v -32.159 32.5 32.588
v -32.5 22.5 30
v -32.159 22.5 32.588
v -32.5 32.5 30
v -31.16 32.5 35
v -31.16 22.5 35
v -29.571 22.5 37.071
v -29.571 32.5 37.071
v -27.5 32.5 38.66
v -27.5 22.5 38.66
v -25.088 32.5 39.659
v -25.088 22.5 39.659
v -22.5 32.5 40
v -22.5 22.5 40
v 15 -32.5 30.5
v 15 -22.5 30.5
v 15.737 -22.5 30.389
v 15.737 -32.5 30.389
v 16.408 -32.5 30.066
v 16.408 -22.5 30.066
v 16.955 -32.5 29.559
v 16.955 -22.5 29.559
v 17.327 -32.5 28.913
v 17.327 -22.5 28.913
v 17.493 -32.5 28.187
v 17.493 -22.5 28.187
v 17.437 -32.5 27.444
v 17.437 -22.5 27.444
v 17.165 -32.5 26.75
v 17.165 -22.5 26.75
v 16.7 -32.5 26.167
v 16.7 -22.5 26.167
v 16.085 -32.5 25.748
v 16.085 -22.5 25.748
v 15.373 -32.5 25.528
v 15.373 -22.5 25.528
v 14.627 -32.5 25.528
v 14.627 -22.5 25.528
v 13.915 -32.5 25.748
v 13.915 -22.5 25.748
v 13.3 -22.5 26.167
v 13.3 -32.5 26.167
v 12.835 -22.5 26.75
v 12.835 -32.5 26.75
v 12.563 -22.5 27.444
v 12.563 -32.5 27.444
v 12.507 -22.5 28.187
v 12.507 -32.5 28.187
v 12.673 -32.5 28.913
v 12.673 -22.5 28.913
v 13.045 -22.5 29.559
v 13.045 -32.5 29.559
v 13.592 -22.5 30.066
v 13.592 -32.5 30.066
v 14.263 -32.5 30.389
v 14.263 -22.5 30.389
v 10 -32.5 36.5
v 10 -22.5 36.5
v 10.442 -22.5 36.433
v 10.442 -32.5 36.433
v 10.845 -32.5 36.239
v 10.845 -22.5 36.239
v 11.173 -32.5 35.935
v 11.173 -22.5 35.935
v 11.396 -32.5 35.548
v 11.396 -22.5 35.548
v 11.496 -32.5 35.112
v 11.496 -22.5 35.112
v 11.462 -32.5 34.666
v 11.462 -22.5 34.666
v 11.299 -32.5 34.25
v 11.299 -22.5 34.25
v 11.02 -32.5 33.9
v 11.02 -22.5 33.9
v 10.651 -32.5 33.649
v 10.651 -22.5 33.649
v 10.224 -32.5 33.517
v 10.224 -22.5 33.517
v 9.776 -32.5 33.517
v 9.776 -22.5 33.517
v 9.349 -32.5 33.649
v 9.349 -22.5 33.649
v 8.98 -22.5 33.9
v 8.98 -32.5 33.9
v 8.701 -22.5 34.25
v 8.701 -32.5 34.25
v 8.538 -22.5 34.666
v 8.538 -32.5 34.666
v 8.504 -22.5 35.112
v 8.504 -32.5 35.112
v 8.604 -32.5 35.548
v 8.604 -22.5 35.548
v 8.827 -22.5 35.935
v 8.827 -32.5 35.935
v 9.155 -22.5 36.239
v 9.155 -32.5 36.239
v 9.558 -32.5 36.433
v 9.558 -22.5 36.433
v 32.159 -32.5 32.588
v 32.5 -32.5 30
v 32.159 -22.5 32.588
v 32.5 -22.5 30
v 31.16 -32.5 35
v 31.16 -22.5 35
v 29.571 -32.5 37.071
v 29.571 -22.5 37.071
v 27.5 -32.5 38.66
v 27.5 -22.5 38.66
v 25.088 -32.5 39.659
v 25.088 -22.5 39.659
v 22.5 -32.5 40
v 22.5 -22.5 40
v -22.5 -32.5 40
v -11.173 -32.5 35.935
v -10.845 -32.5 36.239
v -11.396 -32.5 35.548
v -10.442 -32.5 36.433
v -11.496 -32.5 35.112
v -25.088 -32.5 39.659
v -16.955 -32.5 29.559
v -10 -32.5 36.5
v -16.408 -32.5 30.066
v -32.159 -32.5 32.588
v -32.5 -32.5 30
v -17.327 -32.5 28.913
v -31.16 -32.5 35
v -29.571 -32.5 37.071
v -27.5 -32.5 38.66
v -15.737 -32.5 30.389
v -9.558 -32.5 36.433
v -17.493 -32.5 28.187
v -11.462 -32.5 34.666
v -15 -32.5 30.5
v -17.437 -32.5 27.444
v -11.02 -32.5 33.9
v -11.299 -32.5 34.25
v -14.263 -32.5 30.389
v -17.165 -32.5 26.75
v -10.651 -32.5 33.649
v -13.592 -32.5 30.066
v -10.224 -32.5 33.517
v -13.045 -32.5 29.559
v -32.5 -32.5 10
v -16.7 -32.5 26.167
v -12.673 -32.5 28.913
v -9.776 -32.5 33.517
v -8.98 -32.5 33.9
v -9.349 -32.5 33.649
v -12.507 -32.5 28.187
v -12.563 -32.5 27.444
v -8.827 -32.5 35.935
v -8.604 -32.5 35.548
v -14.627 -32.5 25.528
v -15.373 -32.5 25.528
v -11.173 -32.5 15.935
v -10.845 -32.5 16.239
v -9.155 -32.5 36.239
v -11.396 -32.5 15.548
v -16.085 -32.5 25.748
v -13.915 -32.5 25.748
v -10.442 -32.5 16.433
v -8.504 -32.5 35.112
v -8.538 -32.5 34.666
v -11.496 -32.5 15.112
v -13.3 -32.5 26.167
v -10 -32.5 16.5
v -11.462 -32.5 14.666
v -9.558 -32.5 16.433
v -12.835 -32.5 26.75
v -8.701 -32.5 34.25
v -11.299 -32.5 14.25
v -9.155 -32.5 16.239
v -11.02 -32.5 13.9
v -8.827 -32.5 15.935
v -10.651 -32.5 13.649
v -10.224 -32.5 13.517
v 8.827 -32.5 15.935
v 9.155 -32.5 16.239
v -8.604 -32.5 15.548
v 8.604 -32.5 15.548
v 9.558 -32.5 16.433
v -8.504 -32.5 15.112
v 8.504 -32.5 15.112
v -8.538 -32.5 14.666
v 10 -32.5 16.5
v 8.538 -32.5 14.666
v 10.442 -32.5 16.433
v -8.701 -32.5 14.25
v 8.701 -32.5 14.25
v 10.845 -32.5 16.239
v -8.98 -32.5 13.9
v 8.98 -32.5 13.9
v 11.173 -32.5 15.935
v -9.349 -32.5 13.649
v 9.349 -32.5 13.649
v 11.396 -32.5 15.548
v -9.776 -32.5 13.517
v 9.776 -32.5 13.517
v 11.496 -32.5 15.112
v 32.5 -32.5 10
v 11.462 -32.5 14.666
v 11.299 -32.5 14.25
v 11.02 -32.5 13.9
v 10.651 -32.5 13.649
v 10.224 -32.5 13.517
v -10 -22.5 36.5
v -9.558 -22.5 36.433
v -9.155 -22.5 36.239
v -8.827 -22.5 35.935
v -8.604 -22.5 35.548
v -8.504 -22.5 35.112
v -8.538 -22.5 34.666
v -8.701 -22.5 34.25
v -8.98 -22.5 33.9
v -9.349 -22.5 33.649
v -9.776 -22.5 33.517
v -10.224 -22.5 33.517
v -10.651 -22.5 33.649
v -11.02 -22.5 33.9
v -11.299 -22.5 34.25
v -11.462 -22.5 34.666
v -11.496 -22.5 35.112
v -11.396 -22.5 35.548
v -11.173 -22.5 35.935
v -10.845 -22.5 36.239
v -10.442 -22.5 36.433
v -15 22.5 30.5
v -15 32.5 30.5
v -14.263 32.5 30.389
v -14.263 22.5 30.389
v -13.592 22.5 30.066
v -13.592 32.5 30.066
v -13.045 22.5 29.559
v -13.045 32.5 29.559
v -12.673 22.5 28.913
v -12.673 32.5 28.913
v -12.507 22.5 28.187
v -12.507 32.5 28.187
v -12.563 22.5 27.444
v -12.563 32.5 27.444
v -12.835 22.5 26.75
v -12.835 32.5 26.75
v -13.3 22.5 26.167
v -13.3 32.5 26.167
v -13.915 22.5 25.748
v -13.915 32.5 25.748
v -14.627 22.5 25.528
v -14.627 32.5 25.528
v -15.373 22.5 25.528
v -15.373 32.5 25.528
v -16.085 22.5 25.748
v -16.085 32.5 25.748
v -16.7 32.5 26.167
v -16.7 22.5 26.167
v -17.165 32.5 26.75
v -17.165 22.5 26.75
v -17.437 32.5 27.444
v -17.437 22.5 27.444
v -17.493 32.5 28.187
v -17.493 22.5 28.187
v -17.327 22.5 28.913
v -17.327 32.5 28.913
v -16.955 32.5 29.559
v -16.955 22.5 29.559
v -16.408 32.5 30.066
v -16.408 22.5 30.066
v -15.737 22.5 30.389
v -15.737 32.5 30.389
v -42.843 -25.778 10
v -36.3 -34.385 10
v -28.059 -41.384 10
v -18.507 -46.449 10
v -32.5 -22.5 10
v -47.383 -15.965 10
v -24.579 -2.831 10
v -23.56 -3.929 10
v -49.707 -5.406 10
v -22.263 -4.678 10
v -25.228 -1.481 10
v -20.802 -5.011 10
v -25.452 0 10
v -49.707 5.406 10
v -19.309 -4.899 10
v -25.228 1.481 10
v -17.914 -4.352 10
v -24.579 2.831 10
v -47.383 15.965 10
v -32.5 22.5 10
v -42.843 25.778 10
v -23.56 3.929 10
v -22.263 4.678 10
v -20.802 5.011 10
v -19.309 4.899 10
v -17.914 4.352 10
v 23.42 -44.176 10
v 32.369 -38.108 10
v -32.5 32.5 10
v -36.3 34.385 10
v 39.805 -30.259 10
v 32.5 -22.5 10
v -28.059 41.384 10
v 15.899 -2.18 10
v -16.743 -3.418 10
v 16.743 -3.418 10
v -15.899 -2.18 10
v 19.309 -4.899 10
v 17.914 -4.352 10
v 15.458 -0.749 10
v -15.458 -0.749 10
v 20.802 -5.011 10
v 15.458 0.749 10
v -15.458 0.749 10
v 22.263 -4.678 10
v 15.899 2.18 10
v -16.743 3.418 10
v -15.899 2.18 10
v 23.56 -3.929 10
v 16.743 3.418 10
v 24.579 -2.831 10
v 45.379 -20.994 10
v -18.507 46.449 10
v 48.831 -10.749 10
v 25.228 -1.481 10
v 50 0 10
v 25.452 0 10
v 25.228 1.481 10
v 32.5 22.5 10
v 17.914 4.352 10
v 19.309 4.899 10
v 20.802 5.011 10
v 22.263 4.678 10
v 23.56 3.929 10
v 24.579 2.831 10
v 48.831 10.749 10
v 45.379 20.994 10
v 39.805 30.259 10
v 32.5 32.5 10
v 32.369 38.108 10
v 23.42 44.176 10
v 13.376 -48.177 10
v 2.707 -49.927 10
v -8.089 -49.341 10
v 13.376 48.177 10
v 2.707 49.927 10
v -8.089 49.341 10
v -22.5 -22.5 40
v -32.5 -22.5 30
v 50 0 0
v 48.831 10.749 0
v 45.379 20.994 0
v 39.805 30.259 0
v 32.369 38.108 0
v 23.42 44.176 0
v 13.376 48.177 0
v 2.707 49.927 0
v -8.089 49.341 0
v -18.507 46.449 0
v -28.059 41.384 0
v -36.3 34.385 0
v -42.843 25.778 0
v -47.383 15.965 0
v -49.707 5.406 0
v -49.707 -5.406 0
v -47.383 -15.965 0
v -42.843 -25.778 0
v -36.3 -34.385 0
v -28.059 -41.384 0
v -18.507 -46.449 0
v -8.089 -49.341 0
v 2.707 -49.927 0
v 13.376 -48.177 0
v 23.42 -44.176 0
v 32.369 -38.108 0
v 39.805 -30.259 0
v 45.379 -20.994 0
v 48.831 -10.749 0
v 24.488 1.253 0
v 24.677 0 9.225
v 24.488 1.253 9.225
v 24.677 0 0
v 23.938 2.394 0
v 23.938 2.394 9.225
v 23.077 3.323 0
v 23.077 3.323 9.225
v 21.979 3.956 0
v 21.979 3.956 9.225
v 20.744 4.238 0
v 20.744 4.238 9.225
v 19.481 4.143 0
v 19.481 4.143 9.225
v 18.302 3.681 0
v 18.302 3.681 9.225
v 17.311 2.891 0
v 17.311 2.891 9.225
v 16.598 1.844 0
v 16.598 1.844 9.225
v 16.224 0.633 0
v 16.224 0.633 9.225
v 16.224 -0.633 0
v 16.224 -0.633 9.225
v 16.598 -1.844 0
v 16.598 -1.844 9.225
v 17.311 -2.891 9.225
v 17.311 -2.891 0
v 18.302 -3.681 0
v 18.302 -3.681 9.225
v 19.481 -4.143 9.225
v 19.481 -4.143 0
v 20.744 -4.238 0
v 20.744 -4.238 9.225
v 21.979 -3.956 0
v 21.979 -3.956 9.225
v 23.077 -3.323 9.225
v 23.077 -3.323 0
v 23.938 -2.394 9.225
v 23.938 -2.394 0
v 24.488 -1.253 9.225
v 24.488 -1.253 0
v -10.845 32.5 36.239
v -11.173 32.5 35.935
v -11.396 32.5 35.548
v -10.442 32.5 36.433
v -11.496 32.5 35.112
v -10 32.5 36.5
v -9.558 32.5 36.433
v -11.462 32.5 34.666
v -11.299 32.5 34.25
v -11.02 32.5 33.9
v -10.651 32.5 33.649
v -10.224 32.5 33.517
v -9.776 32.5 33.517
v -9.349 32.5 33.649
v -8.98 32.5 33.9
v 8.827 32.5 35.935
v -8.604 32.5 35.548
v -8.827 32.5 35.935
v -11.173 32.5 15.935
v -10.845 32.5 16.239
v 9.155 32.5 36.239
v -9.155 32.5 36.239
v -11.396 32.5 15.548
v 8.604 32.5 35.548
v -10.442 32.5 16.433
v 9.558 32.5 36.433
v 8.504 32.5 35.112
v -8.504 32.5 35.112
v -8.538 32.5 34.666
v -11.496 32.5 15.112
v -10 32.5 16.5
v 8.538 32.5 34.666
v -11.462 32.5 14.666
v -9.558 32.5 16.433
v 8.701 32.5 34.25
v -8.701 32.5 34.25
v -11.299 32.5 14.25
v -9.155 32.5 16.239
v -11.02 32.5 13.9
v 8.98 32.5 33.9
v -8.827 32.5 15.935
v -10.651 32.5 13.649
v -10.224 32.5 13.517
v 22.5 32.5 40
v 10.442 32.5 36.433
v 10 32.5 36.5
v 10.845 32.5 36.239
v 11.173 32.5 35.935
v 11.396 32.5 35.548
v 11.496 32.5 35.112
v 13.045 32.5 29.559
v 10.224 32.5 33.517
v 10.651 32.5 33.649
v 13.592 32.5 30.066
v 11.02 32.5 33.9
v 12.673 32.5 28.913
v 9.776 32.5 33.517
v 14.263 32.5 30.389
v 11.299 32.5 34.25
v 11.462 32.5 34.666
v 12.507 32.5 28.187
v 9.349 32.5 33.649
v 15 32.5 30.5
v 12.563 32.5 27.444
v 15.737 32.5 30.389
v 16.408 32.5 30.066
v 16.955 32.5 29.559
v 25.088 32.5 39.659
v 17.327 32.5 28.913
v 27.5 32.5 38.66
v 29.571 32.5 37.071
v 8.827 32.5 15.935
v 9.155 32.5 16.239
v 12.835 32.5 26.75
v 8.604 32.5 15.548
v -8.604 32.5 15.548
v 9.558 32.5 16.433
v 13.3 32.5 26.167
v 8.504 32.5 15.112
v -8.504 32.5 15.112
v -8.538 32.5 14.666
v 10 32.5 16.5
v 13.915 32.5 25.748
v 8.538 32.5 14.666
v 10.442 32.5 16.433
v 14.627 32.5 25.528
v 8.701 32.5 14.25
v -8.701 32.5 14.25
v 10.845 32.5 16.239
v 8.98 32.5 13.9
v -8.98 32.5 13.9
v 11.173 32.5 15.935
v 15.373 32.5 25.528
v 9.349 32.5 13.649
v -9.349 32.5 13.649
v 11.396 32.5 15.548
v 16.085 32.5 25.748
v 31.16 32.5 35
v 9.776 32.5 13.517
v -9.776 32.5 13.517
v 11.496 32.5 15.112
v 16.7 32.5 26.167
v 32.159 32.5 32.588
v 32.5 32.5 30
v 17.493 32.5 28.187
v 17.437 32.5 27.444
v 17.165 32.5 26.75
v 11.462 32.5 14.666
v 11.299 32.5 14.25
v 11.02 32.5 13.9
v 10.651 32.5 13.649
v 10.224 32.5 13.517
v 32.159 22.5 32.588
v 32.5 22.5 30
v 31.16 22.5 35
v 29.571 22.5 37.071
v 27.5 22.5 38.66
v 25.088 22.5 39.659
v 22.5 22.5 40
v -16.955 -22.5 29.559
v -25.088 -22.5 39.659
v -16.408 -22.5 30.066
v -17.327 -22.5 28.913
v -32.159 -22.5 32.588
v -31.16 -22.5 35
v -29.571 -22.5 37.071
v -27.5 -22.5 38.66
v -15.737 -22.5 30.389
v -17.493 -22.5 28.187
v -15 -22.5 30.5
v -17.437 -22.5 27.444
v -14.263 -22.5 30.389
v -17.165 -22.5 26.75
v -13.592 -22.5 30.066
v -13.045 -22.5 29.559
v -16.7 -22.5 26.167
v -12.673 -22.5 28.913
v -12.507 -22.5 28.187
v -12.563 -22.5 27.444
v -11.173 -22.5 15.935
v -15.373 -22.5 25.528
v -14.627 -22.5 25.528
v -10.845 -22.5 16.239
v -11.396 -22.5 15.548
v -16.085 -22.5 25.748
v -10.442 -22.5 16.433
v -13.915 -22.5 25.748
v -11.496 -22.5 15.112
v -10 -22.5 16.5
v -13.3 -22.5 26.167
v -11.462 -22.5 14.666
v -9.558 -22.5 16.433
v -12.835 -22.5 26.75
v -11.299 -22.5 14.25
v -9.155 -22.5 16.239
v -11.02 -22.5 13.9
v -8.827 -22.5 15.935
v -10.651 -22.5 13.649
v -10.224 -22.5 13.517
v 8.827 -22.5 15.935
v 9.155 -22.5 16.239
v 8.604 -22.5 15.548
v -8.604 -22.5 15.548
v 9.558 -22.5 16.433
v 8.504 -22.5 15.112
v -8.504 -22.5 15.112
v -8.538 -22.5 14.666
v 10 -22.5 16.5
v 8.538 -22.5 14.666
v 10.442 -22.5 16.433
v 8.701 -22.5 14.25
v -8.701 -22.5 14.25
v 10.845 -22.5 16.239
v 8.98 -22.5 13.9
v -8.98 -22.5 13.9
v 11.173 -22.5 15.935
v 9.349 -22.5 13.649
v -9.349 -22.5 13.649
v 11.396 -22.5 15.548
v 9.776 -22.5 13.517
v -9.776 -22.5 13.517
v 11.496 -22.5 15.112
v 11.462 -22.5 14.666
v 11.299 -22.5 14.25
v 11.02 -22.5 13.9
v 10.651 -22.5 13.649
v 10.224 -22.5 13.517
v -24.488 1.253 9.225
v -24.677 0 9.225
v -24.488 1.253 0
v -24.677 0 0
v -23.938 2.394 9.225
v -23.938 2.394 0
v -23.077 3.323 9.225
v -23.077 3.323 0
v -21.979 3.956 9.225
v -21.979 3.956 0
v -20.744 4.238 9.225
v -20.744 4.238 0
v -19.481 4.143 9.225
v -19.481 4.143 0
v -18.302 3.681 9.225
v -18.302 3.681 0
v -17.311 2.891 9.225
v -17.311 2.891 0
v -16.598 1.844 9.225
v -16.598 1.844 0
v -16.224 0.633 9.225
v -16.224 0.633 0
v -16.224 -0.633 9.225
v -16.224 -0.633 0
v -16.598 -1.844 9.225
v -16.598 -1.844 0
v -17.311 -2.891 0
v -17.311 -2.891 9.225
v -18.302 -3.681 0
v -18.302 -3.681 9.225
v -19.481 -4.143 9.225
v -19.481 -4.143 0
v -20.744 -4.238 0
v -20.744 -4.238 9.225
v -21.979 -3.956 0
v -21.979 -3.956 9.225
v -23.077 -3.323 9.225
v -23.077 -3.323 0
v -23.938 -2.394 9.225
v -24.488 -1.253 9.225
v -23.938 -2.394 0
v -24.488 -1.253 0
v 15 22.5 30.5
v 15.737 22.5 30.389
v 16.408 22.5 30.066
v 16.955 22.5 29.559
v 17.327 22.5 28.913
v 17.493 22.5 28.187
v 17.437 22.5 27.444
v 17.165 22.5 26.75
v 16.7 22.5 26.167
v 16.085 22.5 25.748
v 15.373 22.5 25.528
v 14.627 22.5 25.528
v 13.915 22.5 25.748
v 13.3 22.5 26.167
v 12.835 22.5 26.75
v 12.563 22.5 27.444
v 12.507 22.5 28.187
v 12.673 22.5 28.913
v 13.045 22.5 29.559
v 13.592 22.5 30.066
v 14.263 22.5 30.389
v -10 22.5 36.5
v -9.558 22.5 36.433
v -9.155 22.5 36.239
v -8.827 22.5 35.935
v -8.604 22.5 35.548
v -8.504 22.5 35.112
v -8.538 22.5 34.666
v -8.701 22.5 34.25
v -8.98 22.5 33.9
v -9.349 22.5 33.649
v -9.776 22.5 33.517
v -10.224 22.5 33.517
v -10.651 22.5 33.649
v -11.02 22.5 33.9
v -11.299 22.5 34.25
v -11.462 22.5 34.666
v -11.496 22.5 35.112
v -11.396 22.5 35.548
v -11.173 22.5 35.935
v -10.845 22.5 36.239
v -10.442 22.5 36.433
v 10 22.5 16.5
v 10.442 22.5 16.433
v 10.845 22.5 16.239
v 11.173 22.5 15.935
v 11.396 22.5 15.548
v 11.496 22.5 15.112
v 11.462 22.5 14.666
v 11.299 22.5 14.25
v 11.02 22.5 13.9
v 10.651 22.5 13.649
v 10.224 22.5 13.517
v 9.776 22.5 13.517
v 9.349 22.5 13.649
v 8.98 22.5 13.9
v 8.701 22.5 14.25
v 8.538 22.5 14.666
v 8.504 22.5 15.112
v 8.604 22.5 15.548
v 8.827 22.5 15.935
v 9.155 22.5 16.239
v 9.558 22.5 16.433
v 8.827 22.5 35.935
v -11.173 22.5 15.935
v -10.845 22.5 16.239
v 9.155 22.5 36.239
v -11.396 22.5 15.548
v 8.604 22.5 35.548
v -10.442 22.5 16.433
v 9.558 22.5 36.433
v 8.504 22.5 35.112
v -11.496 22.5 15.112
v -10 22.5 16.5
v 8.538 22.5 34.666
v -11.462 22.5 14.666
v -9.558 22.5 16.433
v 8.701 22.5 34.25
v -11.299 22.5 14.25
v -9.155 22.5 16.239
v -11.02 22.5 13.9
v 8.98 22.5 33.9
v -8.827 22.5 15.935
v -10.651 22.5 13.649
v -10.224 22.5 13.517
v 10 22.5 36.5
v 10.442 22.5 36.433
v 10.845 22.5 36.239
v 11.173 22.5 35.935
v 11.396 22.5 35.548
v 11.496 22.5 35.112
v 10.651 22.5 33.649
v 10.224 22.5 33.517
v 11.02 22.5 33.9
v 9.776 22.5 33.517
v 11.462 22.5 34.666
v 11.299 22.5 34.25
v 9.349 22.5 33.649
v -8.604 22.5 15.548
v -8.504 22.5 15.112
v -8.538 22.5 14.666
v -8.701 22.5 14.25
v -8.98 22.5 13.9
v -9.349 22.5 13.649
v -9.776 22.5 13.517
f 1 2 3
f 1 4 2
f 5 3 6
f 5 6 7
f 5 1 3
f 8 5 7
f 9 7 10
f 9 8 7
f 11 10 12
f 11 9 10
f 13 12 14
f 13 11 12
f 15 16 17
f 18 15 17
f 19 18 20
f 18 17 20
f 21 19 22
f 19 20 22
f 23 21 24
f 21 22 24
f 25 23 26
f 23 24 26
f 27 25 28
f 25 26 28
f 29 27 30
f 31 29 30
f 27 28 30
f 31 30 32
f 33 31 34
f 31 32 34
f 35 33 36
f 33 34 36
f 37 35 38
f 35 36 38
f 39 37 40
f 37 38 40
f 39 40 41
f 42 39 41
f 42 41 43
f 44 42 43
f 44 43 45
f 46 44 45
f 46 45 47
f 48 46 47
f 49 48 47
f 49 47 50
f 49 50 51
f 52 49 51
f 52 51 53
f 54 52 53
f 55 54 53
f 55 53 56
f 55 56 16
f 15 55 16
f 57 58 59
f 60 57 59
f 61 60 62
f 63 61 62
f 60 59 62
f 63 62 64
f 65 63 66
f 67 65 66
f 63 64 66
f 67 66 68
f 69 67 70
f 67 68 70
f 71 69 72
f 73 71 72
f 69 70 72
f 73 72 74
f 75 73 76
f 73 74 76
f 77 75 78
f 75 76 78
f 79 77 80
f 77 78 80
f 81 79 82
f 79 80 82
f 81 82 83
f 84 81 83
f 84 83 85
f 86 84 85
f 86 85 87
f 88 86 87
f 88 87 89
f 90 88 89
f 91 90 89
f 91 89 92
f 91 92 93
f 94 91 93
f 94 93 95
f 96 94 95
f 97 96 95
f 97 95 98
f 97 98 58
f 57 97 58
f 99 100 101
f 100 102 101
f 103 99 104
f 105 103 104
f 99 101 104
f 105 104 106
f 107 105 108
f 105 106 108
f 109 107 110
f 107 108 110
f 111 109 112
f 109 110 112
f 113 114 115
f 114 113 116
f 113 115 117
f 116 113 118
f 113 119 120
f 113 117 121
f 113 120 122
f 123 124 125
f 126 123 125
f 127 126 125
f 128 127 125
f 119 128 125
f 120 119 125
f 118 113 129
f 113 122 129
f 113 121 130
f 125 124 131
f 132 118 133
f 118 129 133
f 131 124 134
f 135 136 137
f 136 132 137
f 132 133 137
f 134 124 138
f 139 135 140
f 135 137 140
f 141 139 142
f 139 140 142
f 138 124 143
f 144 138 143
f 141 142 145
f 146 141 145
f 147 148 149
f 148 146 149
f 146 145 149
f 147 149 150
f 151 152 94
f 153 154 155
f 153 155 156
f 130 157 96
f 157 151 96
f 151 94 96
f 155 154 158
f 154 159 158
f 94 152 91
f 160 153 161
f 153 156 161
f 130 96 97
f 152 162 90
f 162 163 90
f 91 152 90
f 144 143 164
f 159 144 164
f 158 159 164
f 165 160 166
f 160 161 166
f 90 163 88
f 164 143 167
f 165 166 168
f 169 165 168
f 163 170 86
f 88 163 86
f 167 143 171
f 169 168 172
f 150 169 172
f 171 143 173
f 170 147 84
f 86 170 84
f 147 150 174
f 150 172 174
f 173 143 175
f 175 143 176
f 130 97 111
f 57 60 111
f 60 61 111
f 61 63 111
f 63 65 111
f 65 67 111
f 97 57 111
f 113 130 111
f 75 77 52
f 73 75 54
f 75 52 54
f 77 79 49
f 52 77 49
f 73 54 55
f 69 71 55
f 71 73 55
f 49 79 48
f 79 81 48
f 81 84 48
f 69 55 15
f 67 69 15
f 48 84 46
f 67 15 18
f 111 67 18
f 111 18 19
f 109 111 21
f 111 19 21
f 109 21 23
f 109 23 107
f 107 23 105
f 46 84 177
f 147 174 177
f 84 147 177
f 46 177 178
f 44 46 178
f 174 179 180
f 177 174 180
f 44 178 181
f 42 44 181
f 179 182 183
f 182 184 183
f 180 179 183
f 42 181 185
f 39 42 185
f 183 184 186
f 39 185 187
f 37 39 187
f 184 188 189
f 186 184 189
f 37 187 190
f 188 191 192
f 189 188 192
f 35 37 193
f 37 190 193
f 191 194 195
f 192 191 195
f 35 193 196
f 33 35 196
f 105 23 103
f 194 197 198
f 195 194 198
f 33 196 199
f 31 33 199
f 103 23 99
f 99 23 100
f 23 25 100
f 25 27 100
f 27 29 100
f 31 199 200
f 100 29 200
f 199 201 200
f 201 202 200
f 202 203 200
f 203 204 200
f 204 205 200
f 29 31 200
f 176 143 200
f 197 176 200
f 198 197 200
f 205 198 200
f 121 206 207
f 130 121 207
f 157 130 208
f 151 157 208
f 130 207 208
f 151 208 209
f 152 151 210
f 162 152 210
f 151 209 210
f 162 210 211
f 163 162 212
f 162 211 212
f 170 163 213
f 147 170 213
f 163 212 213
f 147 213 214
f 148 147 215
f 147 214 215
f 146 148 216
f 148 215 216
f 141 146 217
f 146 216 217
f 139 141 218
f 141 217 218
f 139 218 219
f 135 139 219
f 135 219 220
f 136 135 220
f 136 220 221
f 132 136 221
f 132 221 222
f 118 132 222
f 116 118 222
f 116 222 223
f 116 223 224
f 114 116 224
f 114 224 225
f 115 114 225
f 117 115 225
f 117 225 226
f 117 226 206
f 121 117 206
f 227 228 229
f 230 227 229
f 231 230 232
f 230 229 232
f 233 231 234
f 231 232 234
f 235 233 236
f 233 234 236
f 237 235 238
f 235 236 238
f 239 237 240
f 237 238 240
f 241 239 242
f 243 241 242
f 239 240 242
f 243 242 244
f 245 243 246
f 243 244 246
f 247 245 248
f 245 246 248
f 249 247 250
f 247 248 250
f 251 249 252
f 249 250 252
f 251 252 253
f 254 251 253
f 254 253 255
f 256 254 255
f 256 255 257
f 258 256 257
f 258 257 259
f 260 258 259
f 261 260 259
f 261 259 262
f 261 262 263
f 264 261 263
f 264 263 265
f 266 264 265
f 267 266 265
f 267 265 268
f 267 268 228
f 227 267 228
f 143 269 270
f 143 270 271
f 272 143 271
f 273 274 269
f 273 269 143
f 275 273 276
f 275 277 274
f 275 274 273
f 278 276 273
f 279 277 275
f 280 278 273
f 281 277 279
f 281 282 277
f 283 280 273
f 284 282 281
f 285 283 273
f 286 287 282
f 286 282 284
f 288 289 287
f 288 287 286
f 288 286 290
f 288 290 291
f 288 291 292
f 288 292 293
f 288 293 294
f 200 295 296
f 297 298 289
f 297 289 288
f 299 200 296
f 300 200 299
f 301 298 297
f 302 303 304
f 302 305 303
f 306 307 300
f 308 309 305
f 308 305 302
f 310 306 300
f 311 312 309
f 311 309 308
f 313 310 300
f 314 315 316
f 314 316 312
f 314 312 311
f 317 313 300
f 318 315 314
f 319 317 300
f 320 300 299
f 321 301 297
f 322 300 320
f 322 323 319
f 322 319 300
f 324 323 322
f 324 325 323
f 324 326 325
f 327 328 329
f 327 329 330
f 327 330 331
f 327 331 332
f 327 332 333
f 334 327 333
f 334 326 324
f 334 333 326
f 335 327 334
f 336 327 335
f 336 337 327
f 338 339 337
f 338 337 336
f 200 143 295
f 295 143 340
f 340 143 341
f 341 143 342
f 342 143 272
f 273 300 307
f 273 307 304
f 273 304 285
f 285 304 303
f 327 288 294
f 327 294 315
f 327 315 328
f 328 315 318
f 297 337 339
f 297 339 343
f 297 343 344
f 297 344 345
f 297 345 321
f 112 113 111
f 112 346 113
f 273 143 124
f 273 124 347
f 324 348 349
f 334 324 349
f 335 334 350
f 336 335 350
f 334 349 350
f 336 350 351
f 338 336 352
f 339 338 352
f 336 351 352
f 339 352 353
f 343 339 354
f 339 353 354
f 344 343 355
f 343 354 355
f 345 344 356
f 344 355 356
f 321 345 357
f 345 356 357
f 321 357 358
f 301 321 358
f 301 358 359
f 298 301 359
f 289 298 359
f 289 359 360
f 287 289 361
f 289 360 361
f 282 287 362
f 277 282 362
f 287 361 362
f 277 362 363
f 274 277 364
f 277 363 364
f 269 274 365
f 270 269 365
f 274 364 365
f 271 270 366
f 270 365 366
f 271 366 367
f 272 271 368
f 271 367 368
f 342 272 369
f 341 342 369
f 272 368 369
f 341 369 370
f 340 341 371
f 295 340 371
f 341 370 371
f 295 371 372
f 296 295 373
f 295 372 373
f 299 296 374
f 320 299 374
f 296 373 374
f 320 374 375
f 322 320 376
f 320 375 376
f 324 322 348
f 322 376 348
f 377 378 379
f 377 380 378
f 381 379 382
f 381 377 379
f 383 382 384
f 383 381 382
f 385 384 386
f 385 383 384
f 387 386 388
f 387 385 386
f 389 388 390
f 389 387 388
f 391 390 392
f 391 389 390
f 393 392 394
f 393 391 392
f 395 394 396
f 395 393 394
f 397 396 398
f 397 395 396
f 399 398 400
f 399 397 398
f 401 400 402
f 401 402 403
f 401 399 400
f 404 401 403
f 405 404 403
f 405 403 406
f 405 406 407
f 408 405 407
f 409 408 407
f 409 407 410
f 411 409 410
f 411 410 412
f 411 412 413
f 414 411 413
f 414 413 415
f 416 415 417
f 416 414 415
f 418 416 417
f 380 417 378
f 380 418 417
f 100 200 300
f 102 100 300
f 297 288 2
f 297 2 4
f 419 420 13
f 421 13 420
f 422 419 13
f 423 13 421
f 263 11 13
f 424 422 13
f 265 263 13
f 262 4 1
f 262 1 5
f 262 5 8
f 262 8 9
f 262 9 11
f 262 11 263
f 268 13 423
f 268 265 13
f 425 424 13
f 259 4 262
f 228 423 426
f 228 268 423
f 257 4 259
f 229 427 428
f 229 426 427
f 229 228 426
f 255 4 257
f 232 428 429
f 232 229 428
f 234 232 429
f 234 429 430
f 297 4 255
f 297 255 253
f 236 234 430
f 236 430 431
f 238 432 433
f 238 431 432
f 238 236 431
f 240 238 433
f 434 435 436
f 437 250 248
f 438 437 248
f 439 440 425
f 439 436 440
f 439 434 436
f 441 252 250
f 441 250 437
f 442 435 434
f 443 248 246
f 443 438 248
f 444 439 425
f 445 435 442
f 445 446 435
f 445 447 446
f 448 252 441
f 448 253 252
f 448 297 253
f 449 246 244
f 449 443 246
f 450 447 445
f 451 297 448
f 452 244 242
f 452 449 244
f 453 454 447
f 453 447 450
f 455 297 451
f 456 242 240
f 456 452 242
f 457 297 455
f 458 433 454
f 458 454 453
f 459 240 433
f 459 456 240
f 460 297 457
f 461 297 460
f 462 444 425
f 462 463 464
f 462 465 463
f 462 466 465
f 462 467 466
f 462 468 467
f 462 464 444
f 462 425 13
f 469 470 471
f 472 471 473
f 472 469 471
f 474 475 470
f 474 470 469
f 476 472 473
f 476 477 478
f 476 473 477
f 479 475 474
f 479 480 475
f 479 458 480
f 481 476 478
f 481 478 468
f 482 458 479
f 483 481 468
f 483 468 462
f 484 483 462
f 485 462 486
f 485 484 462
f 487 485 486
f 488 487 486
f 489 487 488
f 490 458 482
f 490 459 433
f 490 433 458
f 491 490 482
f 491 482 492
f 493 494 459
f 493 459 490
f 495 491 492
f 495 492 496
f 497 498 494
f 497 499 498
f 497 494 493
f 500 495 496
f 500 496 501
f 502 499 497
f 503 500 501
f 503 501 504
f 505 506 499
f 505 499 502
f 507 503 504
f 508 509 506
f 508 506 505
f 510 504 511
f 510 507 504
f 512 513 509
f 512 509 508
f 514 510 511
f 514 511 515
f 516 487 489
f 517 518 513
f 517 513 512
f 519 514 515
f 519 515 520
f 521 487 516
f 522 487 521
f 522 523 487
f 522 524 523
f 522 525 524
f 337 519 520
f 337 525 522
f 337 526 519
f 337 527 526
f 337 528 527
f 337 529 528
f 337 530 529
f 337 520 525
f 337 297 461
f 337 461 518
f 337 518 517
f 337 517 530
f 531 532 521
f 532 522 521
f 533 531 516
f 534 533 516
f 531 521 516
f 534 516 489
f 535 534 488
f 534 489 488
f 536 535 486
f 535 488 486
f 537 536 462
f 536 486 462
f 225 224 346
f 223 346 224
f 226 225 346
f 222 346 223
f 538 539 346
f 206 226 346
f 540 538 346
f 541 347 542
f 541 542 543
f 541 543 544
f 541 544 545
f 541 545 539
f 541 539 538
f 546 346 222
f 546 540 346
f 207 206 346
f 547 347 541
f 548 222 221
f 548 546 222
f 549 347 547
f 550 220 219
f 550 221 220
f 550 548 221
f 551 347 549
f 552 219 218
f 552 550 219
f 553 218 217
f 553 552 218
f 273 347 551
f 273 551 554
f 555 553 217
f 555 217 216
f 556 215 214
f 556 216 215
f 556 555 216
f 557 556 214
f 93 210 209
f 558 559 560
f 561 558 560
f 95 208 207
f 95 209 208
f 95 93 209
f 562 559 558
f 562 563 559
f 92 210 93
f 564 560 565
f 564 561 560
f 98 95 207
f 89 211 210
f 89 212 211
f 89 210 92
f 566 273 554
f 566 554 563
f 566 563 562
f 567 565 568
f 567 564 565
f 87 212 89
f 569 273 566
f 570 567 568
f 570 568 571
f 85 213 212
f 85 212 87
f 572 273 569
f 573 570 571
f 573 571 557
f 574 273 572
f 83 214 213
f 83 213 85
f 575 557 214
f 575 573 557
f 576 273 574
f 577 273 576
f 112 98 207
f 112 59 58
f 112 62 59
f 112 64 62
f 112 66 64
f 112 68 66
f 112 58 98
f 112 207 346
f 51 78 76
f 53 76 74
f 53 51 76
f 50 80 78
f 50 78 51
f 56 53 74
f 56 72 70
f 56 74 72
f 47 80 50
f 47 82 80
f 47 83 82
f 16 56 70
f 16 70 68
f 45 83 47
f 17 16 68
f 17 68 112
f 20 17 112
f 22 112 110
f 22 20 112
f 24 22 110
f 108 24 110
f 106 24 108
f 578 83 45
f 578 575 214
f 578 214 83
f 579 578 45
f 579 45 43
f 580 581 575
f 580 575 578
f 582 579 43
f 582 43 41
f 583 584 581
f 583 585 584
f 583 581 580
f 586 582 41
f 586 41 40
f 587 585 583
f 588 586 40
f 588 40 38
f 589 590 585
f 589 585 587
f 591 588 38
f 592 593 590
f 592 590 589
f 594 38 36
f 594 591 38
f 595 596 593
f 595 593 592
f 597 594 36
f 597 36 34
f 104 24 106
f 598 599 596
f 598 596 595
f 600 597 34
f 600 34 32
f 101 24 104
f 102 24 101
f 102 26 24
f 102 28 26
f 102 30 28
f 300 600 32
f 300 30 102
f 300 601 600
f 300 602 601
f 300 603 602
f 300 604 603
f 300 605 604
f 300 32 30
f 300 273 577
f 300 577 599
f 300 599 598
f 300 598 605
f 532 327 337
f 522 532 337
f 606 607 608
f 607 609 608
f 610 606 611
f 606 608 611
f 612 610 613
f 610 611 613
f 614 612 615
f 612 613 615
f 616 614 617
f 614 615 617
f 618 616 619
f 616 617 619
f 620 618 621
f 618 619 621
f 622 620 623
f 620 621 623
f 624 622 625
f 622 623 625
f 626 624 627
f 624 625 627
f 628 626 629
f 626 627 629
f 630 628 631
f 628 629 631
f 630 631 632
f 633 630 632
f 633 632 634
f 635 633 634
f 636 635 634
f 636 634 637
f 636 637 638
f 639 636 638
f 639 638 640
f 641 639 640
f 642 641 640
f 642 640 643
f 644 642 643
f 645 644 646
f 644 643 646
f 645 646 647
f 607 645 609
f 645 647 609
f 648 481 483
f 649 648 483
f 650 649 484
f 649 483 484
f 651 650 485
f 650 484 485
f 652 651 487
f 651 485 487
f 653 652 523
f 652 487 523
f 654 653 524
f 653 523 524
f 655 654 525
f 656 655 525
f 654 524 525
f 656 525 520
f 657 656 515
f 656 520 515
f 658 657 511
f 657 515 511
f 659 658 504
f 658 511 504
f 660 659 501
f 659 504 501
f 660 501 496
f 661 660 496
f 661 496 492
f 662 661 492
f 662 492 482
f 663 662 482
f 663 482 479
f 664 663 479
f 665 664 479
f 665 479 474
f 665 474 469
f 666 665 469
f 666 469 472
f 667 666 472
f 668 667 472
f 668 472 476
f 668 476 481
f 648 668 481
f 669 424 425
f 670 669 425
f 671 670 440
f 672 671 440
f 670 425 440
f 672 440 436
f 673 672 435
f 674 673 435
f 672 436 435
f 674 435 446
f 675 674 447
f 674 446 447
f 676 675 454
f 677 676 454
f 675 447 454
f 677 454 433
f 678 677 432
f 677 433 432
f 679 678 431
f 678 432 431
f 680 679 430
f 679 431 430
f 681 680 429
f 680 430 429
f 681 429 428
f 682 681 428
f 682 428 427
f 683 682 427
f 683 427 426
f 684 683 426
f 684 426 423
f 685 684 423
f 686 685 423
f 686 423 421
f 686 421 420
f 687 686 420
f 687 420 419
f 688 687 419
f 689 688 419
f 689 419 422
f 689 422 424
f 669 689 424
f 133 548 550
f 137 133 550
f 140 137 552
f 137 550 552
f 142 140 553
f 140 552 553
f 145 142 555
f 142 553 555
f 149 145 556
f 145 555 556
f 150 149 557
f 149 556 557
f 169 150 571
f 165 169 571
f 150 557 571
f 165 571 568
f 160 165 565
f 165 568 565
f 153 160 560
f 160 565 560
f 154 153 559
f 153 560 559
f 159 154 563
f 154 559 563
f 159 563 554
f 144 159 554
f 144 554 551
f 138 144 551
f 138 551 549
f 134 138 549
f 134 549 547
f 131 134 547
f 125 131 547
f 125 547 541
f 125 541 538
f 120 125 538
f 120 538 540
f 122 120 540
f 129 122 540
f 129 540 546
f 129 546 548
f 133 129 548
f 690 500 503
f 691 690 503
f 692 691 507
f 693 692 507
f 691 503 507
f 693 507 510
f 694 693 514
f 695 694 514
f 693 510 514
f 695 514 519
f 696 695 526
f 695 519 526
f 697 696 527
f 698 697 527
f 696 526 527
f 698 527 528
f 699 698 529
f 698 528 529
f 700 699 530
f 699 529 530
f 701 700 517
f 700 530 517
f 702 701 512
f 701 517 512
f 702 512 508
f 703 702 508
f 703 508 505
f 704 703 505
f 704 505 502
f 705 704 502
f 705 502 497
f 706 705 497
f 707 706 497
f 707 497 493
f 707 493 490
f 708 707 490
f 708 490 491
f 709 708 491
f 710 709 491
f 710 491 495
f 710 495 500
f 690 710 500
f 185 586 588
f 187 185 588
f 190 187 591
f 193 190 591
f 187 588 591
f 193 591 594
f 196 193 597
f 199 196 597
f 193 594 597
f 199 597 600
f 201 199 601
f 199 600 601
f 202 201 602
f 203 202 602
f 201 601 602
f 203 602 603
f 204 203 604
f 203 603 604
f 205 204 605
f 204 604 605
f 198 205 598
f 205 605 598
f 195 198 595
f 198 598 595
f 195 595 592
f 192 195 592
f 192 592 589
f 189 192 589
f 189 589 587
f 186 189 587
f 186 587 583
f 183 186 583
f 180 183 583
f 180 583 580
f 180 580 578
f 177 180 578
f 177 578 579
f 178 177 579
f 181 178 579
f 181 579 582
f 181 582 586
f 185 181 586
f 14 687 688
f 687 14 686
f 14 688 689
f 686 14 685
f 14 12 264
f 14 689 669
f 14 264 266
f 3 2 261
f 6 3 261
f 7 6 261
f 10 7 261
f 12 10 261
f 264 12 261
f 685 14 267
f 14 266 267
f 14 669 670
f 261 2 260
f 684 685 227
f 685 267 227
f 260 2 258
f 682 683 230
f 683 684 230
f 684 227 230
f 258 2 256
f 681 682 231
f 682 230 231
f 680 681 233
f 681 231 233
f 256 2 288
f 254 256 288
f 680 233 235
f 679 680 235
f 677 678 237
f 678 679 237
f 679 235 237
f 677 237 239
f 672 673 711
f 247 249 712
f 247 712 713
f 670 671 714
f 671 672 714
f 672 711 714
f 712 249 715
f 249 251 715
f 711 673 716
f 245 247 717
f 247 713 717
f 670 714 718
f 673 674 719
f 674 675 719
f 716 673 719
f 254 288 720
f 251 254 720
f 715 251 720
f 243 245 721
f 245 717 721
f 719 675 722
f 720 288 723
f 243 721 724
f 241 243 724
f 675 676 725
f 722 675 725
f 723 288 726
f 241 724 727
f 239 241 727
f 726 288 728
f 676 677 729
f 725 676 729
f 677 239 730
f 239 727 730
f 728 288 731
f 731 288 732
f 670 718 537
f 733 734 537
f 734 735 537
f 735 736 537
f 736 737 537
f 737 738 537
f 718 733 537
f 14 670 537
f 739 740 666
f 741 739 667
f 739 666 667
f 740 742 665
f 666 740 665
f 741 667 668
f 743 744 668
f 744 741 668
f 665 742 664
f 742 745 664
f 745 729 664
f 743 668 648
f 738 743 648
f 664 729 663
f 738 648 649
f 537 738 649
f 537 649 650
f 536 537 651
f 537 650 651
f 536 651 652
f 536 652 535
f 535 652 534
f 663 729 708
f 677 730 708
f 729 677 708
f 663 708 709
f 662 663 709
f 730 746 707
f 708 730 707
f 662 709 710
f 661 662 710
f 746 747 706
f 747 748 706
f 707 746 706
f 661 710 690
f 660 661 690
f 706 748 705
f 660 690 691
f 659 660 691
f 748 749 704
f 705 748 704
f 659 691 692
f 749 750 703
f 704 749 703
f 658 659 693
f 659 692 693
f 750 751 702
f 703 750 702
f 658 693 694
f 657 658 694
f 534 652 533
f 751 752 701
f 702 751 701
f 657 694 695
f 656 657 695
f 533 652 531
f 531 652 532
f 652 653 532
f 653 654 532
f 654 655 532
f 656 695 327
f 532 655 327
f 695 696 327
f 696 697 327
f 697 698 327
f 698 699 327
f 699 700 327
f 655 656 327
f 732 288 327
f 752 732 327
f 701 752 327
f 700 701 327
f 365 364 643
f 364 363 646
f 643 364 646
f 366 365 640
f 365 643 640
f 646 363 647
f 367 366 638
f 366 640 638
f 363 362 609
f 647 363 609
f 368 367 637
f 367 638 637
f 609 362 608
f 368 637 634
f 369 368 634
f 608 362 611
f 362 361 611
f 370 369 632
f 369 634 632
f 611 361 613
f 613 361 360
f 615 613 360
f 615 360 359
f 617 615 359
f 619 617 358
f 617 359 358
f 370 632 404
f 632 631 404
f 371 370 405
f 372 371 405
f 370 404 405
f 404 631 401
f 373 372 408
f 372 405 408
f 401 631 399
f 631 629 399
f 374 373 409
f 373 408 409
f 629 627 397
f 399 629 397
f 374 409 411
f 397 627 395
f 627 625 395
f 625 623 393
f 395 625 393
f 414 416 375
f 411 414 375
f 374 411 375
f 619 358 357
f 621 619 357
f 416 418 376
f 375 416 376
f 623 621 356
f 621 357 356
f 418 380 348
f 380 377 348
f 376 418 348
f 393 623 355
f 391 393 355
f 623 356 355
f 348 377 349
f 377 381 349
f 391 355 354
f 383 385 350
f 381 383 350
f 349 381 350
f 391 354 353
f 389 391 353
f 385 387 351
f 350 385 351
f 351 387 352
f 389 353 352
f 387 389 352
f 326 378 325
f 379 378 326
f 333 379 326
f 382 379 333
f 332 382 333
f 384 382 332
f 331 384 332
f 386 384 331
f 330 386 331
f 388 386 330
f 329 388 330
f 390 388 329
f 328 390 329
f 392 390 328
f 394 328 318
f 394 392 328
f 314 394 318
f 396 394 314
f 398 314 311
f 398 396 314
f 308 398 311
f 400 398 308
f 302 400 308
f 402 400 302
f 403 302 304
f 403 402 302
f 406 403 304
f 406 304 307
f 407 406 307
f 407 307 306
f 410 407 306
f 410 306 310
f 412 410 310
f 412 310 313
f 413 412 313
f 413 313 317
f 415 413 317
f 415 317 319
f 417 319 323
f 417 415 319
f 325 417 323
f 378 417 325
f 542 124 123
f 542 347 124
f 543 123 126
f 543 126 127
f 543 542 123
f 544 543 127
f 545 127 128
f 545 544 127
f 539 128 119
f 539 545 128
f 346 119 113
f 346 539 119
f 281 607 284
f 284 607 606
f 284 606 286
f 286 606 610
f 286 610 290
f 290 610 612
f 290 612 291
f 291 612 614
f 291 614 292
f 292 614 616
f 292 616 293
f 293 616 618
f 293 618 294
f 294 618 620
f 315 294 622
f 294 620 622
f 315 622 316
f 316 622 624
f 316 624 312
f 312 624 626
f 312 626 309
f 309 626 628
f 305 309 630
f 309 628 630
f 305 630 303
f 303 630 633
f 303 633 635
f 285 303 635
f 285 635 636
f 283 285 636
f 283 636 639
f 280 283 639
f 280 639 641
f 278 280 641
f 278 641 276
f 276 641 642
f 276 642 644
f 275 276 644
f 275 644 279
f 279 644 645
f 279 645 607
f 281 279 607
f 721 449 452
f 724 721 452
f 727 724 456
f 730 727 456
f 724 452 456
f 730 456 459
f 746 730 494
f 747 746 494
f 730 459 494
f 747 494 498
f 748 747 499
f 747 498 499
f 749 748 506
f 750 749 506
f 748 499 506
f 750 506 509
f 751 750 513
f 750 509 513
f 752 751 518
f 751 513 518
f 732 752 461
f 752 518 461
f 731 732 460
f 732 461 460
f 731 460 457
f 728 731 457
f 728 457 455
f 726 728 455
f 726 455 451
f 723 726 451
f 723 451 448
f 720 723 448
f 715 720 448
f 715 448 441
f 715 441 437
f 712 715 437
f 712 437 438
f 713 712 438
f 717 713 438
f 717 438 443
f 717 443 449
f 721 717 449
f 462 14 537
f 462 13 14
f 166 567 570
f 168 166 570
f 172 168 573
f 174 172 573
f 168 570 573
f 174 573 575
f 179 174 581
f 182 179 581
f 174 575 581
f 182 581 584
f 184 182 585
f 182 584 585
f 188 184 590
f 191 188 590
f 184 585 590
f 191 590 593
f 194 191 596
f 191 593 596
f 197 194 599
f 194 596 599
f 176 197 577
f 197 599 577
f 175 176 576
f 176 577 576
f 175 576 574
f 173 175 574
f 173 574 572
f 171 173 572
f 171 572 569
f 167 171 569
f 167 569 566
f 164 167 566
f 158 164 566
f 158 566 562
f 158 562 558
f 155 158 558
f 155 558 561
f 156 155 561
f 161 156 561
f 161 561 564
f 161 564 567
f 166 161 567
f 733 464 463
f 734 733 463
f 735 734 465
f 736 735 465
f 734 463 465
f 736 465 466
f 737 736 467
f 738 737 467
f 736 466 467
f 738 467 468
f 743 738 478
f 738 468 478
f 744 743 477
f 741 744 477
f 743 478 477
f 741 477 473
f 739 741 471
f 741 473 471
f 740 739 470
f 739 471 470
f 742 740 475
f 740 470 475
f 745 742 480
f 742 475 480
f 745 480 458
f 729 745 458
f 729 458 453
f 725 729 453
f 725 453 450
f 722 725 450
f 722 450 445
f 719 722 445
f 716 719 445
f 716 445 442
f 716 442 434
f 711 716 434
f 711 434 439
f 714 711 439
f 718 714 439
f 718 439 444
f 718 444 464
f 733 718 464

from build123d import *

# Parameters (mm, degrees)
SKETCH_1_R                    = 50
EXTRUDE_1_DEPTH               = 10
HOLE_WIZARD_M10_1_D           = 8.5
HOLE_WIZARD_M10_1_CSINK_D     = 10.05
HOLE_WIZARD_M10_1_CSINK_ANGLE = 90
SKETCH_9_W                    = 65
SKETCH_9_H                    = 10
EXTRUDE_3_DEPTH               = 30
FILLET_2_R                    = 10
SKETCH_14_R                   = 2.5
SKETCH_14_R_2                 = 1.5
CUT_EXTRUDE_3_DEPTH           = 105.432992871


with BuildPart() as part:
    # 草图1 → 凸台-拉伸1 (new body)
    with BuildSketch(Plane.XY):
        Circle(SKETCH_1_R)
    extrude(amount=EXTRUDE_1_DEPTH)

    # M10 螺纹孔1 (through all)
    with Locations(Plane.XY.offset(10)):
        with Locations((-20.426671729, 0)):
            hole_wizard_m10_1 = CounterSinkHole(HOLE_WIZARD_M10_1_D / 2, HOLE_WIZARD_M10_1_CSINK_D / 2, counter_sink_angle=HOLE_WIZARD_M10_1_CSINK_ANGLE)

    # 镜向2: M10 螺纹孔1 across plane
    add(hole_wizard_m10_1.mirror(Plane(origin=(0, 0, 0), x_dir=(0, 0, 1), z_dir=(1, 0, 0))), mode=Mode.SUBTRACT)

    # 草图9 → 凸台-拉伸3 (add)
    with BuildSketch(Plane.XY.offset(10)):
        with Locations((0, 27.5)):
            Rectangle(SKETCH_9_W, SKETCH_9_H)
        with Locations((0, -27.5)):
            Rectangle(SKETCH_9_W, SKETCH_9_H)
    extrude(amount=EXTRUDE_3_DEPTH)

    # 圆角2
    fillet_2_edges = [part.edges().sort_by_distance(p)[0] for p in [
        (32.5, -27.5, 40),
        (-32.5, -27.5, 40),
        (-32.5, 27.5, 40),
        (32.5, 27.5, 40),
    ]]
    fillet(fillet_2_edges, radius=FILLET_2_R)

    # 草图14 → 切除-拉伸3 (cut, through all)
    with BuildSketch(Plane(origin=(0, 32.5, 0), x_dir=(1, 0, 0), z_dir=(0, 1, 0))):
        with Locations(Location((-15, -28, 0), (0, 0, 270))):
            Circle(SKETCH_14_R)
        with Locations(Location((10, -15, 0), (0, 0, 270))):
            Circle(SKETCH_14_R_2)
        with Locations(Location((15, -28, 0), (0, 0, 270))):
            Circle(SKETCH_14_R)
        with Locations(Location((10, -35, 0), (0, 0, 270))):
            Circle(SKETCH_14_R_2)
        with Locations(Location((-10, -15, 0), (0, 0, 270))):
            Circle(SKETCH_14_R_2)
        with Locations(Location((-10, -35, 0), (0, 0, 270))):
            Circle(SKETCH_14_R_2)
    extrude(amount=-CUT_EXTRUDE_3_DEPTH, mode=Mode.SUBTRACT)


solid = part.part
